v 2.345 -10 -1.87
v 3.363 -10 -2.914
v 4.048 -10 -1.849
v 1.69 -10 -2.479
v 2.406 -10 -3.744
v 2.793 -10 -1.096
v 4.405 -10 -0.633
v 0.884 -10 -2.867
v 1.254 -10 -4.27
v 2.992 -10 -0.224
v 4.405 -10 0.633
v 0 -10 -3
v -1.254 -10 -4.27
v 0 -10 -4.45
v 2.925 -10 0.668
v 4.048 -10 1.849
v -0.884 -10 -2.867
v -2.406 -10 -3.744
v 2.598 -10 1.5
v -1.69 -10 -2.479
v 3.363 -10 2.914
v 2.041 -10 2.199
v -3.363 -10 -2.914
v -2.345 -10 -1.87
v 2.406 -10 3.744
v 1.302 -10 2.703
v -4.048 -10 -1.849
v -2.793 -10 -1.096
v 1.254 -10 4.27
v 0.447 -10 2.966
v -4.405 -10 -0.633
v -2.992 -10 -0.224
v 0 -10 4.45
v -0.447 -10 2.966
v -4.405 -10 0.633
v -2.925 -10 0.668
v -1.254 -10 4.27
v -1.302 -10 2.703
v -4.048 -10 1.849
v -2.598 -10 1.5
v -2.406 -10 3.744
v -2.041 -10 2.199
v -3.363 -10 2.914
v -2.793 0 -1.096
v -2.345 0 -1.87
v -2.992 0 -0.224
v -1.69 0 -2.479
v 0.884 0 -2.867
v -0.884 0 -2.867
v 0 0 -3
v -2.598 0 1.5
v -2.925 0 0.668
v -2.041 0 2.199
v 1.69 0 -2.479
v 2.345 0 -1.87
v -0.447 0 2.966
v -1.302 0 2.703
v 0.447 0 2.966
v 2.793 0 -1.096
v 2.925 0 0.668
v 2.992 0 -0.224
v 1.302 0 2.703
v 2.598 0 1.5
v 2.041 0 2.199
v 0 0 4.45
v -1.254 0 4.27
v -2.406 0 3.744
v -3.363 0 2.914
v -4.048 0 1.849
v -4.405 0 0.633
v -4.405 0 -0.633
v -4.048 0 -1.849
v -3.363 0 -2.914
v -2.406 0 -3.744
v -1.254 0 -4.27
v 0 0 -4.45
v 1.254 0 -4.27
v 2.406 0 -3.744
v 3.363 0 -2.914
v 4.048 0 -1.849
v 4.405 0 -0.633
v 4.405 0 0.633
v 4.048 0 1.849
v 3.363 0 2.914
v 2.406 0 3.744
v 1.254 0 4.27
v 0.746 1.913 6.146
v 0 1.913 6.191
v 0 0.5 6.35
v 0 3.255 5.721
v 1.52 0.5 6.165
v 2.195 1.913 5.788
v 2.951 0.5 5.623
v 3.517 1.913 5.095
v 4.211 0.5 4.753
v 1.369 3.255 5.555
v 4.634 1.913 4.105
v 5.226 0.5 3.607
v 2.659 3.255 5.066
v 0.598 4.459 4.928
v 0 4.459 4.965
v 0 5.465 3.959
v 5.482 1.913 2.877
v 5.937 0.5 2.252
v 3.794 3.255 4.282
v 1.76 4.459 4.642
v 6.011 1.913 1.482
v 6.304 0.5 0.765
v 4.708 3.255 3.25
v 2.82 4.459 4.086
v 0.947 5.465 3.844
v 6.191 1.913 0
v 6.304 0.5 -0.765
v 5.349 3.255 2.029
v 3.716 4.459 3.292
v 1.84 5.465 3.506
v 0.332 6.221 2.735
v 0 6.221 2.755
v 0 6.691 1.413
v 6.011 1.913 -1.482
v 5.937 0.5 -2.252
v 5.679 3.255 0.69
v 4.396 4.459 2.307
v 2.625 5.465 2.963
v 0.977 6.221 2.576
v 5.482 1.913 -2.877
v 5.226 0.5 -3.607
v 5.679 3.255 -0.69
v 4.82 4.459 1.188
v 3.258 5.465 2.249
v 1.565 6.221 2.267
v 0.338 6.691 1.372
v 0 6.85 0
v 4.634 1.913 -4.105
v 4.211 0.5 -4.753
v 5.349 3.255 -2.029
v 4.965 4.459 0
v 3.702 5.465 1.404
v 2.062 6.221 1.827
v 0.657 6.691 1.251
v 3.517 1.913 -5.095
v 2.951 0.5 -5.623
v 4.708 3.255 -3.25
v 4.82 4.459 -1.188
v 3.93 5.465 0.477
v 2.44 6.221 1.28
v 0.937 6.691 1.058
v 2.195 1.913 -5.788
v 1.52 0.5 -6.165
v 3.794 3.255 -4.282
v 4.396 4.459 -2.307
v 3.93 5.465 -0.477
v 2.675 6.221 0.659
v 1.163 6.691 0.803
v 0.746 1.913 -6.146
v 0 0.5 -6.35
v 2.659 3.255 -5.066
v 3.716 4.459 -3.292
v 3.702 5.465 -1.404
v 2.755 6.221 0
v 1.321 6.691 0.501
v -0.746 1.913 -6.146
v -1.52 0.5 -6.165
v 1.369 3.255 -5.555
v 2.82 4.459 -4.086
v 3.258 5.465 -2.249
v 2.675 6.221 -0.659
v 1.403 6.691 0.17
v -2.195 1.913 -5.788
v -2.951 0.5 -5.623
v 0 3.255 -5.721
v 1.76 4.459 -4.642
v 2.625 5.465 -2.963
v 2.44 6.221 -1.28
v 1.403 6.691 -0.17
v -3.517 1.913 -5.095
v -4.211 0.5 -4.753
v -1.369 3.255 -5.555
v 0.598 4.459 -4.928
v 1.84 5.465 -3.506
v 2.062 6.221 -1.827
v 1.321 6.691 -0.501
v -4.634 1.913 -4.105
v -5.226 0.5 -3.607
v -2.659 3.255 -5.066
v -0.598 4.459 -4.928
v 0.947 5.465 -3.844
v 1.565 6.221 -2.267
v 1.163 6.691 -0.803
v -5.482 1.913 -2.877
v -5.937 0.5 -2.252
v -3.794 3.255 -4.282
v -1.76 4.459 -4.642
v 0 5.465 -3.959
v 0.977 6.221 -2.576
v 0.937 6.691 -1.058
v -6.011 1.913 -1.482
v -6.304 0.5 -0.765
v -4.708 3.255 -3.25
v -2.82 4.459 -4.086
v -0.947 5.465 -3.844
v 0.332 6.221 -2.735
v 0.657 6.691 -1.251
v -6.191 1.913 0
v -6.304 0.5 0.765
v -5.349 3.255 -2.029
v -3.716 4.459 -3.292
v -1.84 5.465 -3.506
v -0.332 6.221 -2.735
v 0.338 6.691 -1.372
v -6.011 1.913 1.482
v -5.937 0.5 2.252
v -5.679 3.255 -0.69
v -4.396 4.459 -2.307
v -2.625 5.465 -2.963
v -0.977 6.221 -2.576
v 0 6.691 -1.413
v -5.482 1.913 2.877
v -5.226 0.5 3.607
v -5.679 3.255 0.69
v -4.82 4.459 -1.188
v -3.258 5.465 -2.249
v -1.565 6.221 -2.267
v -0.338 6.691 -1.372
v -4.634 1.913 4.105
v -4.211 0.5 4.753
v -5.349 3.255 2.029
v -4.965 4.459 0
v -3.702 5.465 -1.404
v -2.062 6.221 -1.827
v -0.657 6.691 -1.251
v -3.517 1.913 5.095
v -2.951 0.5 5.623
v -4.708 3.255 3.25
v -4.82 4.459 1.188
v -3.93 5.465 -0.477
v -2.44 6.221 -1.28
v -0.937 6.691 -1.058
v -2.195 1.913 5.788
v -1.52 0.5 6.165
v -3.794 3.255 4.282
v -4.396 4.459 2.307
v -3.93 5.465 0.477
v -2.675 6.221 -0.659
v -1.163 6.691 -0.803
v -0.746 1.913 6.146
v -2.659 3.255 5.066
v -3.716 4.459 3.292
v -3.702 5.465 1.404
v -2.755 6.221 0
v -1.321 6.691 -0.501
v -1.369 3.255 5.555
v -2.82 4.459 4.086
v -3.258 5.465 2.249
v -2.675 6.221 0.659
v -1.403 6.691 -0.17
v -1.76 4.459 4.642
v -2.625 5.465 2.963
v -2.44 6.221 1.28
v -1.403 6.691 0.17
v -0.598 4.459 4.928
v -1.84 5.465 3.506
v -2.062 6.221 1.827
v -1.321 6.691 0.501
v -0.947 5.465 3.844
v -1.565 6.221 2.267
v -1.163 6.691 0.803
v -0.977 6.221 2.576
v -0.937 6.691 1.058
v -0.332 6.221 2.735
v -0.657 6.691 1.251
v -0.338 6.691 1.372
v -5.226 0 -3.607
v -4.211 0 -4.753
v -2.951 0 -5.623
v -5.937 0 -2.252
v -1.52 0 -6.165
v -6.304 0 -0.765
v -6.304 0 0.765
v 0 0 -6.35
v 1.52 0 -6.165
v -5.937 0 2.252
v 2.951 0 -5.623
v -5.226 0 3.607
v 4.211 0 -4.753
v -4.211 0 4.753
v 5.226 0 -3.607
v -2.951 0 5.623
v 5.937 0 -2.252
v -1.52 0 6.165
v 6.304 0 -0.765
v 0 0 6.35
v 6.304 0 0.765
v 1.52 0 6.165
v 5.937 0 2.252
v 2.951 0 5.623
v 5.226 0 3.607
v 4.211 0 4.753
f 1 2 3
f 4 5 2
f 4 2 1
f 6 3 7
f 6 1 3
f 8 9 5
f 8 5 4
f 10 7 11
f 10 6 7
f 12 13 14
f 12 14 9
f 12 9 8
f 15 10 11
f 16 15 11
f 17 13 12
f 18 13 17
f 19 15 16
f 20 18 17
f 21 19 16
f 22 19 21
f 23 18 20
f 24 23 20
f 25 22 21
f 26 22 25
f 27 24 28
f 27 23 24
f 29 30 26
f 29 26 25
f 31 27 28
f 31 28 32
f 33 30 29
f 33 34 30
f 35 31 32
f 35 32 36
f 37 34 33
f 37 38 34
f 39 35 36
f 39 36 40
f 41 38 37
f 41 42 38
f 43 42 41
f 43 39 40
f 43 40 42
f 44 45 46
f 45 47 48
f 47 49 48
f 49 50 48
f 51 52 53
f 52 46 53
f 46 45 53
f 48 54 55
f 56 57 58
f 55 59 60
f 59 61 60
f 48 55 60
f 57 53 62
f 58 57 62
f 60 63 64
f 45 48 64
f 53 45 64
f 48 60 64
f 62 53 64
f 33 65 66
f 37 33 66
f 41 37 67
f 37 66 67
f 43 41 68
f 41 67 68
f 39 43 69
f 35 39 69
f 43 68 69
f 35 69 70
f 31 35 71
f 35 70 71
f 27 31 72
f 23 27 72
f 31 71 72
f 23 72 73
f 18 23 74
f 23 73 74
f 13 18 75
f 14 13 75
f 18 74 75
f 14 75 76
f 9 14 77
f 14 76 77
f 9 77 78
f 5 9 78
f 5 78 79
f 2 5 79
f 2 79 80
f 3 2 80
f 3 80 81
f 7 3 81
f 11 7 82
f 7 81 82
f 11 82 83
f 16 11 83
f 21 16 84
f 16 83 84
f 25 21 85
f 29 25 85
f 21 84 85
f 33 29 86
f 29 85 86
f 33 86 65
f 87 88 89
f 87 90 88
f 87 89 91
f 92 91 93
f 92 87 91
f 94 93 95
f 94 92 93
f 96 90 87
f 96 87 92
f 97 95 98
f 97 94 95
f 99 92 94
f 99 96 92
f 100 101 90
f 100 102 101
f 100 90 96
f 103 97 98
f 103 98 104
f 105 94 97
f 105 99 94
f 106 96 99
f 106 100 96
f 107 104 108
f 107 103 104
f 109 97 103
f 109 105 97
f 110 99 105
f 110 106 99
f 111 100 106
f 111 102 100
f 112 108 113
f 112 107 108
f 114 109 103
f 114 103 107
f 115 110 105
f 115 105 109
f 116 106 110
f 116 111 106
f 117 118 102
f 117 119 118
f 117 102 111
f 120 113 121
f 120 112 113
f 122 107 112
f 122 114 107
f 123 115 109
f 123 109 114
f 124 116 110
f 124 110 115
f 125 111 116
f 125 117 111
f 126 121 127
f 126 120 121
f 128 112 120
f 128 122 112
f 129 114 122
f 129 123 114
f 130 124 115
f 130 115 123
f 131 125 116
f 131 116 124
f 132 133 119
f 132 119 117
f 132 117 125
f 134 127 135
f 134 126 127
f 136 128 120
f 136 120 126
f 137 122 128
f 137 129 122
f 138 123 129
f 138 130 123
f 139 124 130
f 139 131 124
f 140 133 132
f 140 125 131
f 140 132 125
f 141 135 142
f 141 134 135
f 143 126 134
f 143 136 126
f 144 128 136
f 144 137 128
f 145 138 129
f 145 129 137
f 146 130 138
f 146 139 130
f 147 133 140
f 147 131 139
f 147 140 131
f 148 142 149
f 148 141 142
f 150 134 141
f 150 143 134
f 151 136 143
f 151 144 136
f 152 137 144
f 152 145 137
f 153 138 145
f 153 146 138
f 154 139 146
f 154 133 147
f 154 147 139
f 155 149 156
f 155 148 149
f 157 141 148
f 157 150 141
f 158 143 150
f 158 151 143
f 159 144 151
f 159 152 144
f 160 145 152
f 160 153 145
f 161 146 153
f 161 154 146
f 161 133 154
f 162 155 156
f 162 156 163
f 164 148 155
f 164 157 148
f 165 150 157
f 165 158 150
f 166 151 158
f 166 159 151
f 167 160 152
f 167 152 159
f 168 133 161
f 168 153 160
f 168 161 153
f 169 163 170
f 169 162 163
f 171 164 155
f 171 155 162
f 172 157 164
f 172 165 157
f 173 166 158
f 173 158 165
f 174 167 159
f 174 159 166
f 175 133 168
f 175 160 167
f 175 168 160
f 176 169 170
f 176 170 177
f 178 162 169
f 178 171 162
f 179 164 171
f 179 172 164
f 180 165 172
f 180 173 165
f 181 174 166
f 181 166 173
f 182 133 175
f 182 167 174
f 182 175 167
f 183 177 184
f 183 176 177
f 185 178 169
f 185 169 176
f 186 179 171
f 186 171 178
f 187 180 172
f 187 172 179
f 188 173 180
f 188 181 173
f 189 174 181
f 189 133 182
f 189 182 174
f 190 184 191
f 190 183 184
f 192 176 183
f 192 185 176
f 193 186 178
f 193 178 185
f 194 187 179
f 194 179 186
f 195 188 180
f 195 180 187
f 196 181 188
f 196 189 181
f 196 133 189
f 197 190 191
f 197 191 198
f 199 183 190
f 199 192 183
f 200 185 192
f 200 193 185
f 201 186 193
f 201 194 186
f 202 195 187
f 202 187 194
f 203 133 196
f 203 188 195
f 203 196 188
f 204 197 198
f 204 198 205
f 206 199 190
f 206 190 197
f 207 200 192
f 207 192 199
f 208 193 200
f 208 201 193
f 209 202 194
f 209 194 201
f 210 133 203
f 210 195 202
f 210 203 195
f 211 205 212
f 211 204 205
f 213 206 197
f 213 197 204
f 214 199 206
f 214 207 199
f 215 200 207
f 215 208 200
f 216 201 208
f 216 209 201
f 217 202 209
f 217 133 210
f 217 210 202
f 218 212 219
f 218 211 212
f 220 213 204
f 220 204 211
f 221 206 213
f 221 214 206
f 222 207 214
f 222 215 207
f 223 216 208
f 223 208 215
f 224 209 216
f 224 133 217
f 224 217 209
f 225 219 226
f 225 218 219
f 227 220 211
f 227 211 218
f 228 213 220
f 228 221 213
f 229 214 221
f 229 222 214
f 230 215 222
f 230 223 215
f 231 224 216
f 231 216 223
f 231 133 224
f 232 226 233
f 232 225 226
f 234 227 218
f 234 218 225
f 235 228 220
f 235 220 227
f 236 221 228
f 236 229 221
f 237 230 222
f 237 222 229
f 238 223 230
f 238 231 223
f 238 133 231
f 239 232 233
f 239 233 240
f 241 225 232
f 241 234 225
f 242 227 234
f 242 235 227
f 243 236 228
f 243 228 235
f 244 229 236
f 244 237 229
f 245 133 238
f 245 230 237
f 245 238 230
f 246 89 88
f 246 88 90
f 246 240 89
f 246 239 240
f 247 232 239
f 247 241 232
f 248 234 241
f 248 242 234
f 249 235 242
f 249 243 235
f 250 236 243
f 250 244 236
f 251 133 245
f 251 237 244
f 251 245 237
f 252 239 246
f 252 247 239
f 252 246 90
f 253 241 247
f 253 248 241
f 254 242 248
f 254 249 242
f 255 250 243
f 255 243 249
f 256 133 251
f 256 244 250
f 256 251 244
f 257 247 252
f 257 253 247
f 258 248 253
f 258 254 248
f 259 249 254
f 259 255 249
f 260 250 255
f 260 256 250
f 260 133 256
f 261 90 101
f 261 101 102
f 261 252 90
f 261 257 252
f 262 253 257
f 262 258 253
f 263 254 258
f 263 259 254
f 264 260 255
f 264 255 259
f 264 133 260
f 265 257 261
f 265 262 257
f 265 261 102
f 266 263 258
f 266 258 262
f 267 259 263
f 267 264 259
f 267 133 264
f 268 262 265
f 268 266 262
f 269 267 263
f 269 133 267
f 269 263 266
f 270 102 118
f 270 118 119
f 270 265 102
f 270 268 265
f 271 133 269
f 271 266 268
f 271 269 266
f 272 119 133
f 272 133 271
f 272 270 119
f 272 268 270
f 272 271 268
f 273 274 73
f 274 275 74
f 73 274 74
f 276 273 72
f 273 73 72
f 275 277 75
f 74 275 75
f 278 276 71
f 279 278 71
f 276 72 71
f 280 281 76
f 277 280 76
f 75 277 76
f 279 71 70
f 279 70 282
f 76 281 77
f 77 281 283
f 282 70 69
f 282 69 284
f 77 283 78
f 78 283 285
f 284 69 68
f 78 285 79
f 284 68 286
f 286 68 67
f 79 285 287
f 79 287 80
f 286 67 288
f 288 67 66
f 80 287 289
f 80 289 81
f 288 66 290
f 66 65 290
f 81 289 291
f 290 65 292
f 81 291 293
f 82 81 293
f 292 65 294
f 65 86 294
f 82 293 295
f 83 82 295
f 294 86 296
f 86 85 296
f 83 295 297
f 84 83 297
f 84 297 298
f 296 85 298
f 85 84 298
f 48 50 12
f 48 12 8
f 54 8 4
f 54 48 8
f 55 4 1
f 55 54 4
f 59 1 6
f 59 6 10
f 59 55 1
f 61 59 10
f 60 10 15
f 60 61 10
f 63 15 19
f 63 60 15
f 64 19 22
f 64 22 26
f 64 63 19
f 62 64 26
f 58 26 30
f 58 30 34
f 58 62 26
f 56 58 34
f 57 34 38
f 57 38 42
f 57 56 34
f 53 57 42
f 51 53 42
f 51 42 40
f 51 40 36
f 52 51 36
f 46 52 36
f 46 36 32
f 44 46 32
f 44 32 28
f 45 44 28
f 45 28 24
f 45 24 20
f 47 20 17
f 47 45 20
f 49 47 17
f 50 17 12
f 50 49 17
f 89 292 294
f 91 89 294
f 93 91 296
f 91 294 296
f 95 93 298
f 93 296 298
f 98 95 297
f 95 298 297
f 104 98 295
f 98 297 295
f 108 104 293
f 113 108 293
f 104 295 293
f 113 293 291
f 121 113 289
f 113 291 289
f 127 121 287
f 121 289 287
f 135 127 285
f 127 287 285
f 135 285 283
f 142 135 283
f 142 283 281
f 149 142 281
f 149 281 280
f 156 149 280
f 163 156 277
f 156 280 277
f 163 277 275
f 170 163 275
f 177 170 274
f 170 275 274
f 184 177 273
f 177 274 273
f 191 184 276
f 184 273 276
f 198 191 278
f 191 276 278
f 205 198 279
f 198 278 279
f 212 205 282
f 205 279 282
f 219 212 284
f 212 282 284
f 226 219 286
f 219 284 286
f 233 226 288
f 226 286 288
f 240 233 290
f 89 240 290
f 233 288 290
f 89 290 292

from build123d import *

# Parameters (mm, degrees)
SKETCH1_R           = 6.35
BOSS_EXTRUDE1_DEPTH = 0.5
DOME1_FACE_RADIUS   = 6.35
DOME1_HEIGHT        = 6.35
SKETCH2_R           = 4.45
SKETCH2_R_2         = 3
BOSS_EXTRUDE2_DEPTH = 10


with BuildPart() as part:
    # Sketch1 → Boss-Extrude1 (new body)
    with BuildSketch(Plane(origin=(0, 0, 0), x_dir=(1, 0, 0), z_dir=(0, 1, 0))):
        with Locations(Location((0, 0, 0), (0, 0, 270))):
            Circle(SKETCH1_R)
    extrude(amount=BOSS_EXTRUDE1_DEPTH)

    # Dome1: a dome of height H over a round flat face of radius A is a cap of a sphere of radius (A * A + H * H) / (2 * H)
    dome1_r = (DOME1_FACE_RADIUS * DOME1_FACE_RADIUS + DOME1_HEIGHT * DOME1_HEIGHT) / (2 * DOME1_HEIGHT)
    dome1_base = Plane((0, 0.5, 0), z_dir=(0, 1, 0))
    with Locations(dome1_base.offset(DOME1_HEIGHT - dome1_r)):
        dome1_ball = Sphere(dome1_r, mode=Mode.PRIVATE)
    add(split(dome1_ball, bisect_by=dome1_base, keep=Keep.TOP, mode=Mode.PRIVATE))

    # Sketch2 → Boss-Extrude2 (add)
    with BuildSketch(Plane.XZ):
        with Locations(Location((0, 0, 0), (0, 0, 90))):
            Circle(SKETCH2_R)
        with Locations(Location((0, 0, 0), (0, 0, 270))):
            Circle(SKETCH2_R_2, mode=Mode.SUBTRACT)
    extrude(amount=BOSS_EXTRUDE2_DEPTH)


solid = part.part
